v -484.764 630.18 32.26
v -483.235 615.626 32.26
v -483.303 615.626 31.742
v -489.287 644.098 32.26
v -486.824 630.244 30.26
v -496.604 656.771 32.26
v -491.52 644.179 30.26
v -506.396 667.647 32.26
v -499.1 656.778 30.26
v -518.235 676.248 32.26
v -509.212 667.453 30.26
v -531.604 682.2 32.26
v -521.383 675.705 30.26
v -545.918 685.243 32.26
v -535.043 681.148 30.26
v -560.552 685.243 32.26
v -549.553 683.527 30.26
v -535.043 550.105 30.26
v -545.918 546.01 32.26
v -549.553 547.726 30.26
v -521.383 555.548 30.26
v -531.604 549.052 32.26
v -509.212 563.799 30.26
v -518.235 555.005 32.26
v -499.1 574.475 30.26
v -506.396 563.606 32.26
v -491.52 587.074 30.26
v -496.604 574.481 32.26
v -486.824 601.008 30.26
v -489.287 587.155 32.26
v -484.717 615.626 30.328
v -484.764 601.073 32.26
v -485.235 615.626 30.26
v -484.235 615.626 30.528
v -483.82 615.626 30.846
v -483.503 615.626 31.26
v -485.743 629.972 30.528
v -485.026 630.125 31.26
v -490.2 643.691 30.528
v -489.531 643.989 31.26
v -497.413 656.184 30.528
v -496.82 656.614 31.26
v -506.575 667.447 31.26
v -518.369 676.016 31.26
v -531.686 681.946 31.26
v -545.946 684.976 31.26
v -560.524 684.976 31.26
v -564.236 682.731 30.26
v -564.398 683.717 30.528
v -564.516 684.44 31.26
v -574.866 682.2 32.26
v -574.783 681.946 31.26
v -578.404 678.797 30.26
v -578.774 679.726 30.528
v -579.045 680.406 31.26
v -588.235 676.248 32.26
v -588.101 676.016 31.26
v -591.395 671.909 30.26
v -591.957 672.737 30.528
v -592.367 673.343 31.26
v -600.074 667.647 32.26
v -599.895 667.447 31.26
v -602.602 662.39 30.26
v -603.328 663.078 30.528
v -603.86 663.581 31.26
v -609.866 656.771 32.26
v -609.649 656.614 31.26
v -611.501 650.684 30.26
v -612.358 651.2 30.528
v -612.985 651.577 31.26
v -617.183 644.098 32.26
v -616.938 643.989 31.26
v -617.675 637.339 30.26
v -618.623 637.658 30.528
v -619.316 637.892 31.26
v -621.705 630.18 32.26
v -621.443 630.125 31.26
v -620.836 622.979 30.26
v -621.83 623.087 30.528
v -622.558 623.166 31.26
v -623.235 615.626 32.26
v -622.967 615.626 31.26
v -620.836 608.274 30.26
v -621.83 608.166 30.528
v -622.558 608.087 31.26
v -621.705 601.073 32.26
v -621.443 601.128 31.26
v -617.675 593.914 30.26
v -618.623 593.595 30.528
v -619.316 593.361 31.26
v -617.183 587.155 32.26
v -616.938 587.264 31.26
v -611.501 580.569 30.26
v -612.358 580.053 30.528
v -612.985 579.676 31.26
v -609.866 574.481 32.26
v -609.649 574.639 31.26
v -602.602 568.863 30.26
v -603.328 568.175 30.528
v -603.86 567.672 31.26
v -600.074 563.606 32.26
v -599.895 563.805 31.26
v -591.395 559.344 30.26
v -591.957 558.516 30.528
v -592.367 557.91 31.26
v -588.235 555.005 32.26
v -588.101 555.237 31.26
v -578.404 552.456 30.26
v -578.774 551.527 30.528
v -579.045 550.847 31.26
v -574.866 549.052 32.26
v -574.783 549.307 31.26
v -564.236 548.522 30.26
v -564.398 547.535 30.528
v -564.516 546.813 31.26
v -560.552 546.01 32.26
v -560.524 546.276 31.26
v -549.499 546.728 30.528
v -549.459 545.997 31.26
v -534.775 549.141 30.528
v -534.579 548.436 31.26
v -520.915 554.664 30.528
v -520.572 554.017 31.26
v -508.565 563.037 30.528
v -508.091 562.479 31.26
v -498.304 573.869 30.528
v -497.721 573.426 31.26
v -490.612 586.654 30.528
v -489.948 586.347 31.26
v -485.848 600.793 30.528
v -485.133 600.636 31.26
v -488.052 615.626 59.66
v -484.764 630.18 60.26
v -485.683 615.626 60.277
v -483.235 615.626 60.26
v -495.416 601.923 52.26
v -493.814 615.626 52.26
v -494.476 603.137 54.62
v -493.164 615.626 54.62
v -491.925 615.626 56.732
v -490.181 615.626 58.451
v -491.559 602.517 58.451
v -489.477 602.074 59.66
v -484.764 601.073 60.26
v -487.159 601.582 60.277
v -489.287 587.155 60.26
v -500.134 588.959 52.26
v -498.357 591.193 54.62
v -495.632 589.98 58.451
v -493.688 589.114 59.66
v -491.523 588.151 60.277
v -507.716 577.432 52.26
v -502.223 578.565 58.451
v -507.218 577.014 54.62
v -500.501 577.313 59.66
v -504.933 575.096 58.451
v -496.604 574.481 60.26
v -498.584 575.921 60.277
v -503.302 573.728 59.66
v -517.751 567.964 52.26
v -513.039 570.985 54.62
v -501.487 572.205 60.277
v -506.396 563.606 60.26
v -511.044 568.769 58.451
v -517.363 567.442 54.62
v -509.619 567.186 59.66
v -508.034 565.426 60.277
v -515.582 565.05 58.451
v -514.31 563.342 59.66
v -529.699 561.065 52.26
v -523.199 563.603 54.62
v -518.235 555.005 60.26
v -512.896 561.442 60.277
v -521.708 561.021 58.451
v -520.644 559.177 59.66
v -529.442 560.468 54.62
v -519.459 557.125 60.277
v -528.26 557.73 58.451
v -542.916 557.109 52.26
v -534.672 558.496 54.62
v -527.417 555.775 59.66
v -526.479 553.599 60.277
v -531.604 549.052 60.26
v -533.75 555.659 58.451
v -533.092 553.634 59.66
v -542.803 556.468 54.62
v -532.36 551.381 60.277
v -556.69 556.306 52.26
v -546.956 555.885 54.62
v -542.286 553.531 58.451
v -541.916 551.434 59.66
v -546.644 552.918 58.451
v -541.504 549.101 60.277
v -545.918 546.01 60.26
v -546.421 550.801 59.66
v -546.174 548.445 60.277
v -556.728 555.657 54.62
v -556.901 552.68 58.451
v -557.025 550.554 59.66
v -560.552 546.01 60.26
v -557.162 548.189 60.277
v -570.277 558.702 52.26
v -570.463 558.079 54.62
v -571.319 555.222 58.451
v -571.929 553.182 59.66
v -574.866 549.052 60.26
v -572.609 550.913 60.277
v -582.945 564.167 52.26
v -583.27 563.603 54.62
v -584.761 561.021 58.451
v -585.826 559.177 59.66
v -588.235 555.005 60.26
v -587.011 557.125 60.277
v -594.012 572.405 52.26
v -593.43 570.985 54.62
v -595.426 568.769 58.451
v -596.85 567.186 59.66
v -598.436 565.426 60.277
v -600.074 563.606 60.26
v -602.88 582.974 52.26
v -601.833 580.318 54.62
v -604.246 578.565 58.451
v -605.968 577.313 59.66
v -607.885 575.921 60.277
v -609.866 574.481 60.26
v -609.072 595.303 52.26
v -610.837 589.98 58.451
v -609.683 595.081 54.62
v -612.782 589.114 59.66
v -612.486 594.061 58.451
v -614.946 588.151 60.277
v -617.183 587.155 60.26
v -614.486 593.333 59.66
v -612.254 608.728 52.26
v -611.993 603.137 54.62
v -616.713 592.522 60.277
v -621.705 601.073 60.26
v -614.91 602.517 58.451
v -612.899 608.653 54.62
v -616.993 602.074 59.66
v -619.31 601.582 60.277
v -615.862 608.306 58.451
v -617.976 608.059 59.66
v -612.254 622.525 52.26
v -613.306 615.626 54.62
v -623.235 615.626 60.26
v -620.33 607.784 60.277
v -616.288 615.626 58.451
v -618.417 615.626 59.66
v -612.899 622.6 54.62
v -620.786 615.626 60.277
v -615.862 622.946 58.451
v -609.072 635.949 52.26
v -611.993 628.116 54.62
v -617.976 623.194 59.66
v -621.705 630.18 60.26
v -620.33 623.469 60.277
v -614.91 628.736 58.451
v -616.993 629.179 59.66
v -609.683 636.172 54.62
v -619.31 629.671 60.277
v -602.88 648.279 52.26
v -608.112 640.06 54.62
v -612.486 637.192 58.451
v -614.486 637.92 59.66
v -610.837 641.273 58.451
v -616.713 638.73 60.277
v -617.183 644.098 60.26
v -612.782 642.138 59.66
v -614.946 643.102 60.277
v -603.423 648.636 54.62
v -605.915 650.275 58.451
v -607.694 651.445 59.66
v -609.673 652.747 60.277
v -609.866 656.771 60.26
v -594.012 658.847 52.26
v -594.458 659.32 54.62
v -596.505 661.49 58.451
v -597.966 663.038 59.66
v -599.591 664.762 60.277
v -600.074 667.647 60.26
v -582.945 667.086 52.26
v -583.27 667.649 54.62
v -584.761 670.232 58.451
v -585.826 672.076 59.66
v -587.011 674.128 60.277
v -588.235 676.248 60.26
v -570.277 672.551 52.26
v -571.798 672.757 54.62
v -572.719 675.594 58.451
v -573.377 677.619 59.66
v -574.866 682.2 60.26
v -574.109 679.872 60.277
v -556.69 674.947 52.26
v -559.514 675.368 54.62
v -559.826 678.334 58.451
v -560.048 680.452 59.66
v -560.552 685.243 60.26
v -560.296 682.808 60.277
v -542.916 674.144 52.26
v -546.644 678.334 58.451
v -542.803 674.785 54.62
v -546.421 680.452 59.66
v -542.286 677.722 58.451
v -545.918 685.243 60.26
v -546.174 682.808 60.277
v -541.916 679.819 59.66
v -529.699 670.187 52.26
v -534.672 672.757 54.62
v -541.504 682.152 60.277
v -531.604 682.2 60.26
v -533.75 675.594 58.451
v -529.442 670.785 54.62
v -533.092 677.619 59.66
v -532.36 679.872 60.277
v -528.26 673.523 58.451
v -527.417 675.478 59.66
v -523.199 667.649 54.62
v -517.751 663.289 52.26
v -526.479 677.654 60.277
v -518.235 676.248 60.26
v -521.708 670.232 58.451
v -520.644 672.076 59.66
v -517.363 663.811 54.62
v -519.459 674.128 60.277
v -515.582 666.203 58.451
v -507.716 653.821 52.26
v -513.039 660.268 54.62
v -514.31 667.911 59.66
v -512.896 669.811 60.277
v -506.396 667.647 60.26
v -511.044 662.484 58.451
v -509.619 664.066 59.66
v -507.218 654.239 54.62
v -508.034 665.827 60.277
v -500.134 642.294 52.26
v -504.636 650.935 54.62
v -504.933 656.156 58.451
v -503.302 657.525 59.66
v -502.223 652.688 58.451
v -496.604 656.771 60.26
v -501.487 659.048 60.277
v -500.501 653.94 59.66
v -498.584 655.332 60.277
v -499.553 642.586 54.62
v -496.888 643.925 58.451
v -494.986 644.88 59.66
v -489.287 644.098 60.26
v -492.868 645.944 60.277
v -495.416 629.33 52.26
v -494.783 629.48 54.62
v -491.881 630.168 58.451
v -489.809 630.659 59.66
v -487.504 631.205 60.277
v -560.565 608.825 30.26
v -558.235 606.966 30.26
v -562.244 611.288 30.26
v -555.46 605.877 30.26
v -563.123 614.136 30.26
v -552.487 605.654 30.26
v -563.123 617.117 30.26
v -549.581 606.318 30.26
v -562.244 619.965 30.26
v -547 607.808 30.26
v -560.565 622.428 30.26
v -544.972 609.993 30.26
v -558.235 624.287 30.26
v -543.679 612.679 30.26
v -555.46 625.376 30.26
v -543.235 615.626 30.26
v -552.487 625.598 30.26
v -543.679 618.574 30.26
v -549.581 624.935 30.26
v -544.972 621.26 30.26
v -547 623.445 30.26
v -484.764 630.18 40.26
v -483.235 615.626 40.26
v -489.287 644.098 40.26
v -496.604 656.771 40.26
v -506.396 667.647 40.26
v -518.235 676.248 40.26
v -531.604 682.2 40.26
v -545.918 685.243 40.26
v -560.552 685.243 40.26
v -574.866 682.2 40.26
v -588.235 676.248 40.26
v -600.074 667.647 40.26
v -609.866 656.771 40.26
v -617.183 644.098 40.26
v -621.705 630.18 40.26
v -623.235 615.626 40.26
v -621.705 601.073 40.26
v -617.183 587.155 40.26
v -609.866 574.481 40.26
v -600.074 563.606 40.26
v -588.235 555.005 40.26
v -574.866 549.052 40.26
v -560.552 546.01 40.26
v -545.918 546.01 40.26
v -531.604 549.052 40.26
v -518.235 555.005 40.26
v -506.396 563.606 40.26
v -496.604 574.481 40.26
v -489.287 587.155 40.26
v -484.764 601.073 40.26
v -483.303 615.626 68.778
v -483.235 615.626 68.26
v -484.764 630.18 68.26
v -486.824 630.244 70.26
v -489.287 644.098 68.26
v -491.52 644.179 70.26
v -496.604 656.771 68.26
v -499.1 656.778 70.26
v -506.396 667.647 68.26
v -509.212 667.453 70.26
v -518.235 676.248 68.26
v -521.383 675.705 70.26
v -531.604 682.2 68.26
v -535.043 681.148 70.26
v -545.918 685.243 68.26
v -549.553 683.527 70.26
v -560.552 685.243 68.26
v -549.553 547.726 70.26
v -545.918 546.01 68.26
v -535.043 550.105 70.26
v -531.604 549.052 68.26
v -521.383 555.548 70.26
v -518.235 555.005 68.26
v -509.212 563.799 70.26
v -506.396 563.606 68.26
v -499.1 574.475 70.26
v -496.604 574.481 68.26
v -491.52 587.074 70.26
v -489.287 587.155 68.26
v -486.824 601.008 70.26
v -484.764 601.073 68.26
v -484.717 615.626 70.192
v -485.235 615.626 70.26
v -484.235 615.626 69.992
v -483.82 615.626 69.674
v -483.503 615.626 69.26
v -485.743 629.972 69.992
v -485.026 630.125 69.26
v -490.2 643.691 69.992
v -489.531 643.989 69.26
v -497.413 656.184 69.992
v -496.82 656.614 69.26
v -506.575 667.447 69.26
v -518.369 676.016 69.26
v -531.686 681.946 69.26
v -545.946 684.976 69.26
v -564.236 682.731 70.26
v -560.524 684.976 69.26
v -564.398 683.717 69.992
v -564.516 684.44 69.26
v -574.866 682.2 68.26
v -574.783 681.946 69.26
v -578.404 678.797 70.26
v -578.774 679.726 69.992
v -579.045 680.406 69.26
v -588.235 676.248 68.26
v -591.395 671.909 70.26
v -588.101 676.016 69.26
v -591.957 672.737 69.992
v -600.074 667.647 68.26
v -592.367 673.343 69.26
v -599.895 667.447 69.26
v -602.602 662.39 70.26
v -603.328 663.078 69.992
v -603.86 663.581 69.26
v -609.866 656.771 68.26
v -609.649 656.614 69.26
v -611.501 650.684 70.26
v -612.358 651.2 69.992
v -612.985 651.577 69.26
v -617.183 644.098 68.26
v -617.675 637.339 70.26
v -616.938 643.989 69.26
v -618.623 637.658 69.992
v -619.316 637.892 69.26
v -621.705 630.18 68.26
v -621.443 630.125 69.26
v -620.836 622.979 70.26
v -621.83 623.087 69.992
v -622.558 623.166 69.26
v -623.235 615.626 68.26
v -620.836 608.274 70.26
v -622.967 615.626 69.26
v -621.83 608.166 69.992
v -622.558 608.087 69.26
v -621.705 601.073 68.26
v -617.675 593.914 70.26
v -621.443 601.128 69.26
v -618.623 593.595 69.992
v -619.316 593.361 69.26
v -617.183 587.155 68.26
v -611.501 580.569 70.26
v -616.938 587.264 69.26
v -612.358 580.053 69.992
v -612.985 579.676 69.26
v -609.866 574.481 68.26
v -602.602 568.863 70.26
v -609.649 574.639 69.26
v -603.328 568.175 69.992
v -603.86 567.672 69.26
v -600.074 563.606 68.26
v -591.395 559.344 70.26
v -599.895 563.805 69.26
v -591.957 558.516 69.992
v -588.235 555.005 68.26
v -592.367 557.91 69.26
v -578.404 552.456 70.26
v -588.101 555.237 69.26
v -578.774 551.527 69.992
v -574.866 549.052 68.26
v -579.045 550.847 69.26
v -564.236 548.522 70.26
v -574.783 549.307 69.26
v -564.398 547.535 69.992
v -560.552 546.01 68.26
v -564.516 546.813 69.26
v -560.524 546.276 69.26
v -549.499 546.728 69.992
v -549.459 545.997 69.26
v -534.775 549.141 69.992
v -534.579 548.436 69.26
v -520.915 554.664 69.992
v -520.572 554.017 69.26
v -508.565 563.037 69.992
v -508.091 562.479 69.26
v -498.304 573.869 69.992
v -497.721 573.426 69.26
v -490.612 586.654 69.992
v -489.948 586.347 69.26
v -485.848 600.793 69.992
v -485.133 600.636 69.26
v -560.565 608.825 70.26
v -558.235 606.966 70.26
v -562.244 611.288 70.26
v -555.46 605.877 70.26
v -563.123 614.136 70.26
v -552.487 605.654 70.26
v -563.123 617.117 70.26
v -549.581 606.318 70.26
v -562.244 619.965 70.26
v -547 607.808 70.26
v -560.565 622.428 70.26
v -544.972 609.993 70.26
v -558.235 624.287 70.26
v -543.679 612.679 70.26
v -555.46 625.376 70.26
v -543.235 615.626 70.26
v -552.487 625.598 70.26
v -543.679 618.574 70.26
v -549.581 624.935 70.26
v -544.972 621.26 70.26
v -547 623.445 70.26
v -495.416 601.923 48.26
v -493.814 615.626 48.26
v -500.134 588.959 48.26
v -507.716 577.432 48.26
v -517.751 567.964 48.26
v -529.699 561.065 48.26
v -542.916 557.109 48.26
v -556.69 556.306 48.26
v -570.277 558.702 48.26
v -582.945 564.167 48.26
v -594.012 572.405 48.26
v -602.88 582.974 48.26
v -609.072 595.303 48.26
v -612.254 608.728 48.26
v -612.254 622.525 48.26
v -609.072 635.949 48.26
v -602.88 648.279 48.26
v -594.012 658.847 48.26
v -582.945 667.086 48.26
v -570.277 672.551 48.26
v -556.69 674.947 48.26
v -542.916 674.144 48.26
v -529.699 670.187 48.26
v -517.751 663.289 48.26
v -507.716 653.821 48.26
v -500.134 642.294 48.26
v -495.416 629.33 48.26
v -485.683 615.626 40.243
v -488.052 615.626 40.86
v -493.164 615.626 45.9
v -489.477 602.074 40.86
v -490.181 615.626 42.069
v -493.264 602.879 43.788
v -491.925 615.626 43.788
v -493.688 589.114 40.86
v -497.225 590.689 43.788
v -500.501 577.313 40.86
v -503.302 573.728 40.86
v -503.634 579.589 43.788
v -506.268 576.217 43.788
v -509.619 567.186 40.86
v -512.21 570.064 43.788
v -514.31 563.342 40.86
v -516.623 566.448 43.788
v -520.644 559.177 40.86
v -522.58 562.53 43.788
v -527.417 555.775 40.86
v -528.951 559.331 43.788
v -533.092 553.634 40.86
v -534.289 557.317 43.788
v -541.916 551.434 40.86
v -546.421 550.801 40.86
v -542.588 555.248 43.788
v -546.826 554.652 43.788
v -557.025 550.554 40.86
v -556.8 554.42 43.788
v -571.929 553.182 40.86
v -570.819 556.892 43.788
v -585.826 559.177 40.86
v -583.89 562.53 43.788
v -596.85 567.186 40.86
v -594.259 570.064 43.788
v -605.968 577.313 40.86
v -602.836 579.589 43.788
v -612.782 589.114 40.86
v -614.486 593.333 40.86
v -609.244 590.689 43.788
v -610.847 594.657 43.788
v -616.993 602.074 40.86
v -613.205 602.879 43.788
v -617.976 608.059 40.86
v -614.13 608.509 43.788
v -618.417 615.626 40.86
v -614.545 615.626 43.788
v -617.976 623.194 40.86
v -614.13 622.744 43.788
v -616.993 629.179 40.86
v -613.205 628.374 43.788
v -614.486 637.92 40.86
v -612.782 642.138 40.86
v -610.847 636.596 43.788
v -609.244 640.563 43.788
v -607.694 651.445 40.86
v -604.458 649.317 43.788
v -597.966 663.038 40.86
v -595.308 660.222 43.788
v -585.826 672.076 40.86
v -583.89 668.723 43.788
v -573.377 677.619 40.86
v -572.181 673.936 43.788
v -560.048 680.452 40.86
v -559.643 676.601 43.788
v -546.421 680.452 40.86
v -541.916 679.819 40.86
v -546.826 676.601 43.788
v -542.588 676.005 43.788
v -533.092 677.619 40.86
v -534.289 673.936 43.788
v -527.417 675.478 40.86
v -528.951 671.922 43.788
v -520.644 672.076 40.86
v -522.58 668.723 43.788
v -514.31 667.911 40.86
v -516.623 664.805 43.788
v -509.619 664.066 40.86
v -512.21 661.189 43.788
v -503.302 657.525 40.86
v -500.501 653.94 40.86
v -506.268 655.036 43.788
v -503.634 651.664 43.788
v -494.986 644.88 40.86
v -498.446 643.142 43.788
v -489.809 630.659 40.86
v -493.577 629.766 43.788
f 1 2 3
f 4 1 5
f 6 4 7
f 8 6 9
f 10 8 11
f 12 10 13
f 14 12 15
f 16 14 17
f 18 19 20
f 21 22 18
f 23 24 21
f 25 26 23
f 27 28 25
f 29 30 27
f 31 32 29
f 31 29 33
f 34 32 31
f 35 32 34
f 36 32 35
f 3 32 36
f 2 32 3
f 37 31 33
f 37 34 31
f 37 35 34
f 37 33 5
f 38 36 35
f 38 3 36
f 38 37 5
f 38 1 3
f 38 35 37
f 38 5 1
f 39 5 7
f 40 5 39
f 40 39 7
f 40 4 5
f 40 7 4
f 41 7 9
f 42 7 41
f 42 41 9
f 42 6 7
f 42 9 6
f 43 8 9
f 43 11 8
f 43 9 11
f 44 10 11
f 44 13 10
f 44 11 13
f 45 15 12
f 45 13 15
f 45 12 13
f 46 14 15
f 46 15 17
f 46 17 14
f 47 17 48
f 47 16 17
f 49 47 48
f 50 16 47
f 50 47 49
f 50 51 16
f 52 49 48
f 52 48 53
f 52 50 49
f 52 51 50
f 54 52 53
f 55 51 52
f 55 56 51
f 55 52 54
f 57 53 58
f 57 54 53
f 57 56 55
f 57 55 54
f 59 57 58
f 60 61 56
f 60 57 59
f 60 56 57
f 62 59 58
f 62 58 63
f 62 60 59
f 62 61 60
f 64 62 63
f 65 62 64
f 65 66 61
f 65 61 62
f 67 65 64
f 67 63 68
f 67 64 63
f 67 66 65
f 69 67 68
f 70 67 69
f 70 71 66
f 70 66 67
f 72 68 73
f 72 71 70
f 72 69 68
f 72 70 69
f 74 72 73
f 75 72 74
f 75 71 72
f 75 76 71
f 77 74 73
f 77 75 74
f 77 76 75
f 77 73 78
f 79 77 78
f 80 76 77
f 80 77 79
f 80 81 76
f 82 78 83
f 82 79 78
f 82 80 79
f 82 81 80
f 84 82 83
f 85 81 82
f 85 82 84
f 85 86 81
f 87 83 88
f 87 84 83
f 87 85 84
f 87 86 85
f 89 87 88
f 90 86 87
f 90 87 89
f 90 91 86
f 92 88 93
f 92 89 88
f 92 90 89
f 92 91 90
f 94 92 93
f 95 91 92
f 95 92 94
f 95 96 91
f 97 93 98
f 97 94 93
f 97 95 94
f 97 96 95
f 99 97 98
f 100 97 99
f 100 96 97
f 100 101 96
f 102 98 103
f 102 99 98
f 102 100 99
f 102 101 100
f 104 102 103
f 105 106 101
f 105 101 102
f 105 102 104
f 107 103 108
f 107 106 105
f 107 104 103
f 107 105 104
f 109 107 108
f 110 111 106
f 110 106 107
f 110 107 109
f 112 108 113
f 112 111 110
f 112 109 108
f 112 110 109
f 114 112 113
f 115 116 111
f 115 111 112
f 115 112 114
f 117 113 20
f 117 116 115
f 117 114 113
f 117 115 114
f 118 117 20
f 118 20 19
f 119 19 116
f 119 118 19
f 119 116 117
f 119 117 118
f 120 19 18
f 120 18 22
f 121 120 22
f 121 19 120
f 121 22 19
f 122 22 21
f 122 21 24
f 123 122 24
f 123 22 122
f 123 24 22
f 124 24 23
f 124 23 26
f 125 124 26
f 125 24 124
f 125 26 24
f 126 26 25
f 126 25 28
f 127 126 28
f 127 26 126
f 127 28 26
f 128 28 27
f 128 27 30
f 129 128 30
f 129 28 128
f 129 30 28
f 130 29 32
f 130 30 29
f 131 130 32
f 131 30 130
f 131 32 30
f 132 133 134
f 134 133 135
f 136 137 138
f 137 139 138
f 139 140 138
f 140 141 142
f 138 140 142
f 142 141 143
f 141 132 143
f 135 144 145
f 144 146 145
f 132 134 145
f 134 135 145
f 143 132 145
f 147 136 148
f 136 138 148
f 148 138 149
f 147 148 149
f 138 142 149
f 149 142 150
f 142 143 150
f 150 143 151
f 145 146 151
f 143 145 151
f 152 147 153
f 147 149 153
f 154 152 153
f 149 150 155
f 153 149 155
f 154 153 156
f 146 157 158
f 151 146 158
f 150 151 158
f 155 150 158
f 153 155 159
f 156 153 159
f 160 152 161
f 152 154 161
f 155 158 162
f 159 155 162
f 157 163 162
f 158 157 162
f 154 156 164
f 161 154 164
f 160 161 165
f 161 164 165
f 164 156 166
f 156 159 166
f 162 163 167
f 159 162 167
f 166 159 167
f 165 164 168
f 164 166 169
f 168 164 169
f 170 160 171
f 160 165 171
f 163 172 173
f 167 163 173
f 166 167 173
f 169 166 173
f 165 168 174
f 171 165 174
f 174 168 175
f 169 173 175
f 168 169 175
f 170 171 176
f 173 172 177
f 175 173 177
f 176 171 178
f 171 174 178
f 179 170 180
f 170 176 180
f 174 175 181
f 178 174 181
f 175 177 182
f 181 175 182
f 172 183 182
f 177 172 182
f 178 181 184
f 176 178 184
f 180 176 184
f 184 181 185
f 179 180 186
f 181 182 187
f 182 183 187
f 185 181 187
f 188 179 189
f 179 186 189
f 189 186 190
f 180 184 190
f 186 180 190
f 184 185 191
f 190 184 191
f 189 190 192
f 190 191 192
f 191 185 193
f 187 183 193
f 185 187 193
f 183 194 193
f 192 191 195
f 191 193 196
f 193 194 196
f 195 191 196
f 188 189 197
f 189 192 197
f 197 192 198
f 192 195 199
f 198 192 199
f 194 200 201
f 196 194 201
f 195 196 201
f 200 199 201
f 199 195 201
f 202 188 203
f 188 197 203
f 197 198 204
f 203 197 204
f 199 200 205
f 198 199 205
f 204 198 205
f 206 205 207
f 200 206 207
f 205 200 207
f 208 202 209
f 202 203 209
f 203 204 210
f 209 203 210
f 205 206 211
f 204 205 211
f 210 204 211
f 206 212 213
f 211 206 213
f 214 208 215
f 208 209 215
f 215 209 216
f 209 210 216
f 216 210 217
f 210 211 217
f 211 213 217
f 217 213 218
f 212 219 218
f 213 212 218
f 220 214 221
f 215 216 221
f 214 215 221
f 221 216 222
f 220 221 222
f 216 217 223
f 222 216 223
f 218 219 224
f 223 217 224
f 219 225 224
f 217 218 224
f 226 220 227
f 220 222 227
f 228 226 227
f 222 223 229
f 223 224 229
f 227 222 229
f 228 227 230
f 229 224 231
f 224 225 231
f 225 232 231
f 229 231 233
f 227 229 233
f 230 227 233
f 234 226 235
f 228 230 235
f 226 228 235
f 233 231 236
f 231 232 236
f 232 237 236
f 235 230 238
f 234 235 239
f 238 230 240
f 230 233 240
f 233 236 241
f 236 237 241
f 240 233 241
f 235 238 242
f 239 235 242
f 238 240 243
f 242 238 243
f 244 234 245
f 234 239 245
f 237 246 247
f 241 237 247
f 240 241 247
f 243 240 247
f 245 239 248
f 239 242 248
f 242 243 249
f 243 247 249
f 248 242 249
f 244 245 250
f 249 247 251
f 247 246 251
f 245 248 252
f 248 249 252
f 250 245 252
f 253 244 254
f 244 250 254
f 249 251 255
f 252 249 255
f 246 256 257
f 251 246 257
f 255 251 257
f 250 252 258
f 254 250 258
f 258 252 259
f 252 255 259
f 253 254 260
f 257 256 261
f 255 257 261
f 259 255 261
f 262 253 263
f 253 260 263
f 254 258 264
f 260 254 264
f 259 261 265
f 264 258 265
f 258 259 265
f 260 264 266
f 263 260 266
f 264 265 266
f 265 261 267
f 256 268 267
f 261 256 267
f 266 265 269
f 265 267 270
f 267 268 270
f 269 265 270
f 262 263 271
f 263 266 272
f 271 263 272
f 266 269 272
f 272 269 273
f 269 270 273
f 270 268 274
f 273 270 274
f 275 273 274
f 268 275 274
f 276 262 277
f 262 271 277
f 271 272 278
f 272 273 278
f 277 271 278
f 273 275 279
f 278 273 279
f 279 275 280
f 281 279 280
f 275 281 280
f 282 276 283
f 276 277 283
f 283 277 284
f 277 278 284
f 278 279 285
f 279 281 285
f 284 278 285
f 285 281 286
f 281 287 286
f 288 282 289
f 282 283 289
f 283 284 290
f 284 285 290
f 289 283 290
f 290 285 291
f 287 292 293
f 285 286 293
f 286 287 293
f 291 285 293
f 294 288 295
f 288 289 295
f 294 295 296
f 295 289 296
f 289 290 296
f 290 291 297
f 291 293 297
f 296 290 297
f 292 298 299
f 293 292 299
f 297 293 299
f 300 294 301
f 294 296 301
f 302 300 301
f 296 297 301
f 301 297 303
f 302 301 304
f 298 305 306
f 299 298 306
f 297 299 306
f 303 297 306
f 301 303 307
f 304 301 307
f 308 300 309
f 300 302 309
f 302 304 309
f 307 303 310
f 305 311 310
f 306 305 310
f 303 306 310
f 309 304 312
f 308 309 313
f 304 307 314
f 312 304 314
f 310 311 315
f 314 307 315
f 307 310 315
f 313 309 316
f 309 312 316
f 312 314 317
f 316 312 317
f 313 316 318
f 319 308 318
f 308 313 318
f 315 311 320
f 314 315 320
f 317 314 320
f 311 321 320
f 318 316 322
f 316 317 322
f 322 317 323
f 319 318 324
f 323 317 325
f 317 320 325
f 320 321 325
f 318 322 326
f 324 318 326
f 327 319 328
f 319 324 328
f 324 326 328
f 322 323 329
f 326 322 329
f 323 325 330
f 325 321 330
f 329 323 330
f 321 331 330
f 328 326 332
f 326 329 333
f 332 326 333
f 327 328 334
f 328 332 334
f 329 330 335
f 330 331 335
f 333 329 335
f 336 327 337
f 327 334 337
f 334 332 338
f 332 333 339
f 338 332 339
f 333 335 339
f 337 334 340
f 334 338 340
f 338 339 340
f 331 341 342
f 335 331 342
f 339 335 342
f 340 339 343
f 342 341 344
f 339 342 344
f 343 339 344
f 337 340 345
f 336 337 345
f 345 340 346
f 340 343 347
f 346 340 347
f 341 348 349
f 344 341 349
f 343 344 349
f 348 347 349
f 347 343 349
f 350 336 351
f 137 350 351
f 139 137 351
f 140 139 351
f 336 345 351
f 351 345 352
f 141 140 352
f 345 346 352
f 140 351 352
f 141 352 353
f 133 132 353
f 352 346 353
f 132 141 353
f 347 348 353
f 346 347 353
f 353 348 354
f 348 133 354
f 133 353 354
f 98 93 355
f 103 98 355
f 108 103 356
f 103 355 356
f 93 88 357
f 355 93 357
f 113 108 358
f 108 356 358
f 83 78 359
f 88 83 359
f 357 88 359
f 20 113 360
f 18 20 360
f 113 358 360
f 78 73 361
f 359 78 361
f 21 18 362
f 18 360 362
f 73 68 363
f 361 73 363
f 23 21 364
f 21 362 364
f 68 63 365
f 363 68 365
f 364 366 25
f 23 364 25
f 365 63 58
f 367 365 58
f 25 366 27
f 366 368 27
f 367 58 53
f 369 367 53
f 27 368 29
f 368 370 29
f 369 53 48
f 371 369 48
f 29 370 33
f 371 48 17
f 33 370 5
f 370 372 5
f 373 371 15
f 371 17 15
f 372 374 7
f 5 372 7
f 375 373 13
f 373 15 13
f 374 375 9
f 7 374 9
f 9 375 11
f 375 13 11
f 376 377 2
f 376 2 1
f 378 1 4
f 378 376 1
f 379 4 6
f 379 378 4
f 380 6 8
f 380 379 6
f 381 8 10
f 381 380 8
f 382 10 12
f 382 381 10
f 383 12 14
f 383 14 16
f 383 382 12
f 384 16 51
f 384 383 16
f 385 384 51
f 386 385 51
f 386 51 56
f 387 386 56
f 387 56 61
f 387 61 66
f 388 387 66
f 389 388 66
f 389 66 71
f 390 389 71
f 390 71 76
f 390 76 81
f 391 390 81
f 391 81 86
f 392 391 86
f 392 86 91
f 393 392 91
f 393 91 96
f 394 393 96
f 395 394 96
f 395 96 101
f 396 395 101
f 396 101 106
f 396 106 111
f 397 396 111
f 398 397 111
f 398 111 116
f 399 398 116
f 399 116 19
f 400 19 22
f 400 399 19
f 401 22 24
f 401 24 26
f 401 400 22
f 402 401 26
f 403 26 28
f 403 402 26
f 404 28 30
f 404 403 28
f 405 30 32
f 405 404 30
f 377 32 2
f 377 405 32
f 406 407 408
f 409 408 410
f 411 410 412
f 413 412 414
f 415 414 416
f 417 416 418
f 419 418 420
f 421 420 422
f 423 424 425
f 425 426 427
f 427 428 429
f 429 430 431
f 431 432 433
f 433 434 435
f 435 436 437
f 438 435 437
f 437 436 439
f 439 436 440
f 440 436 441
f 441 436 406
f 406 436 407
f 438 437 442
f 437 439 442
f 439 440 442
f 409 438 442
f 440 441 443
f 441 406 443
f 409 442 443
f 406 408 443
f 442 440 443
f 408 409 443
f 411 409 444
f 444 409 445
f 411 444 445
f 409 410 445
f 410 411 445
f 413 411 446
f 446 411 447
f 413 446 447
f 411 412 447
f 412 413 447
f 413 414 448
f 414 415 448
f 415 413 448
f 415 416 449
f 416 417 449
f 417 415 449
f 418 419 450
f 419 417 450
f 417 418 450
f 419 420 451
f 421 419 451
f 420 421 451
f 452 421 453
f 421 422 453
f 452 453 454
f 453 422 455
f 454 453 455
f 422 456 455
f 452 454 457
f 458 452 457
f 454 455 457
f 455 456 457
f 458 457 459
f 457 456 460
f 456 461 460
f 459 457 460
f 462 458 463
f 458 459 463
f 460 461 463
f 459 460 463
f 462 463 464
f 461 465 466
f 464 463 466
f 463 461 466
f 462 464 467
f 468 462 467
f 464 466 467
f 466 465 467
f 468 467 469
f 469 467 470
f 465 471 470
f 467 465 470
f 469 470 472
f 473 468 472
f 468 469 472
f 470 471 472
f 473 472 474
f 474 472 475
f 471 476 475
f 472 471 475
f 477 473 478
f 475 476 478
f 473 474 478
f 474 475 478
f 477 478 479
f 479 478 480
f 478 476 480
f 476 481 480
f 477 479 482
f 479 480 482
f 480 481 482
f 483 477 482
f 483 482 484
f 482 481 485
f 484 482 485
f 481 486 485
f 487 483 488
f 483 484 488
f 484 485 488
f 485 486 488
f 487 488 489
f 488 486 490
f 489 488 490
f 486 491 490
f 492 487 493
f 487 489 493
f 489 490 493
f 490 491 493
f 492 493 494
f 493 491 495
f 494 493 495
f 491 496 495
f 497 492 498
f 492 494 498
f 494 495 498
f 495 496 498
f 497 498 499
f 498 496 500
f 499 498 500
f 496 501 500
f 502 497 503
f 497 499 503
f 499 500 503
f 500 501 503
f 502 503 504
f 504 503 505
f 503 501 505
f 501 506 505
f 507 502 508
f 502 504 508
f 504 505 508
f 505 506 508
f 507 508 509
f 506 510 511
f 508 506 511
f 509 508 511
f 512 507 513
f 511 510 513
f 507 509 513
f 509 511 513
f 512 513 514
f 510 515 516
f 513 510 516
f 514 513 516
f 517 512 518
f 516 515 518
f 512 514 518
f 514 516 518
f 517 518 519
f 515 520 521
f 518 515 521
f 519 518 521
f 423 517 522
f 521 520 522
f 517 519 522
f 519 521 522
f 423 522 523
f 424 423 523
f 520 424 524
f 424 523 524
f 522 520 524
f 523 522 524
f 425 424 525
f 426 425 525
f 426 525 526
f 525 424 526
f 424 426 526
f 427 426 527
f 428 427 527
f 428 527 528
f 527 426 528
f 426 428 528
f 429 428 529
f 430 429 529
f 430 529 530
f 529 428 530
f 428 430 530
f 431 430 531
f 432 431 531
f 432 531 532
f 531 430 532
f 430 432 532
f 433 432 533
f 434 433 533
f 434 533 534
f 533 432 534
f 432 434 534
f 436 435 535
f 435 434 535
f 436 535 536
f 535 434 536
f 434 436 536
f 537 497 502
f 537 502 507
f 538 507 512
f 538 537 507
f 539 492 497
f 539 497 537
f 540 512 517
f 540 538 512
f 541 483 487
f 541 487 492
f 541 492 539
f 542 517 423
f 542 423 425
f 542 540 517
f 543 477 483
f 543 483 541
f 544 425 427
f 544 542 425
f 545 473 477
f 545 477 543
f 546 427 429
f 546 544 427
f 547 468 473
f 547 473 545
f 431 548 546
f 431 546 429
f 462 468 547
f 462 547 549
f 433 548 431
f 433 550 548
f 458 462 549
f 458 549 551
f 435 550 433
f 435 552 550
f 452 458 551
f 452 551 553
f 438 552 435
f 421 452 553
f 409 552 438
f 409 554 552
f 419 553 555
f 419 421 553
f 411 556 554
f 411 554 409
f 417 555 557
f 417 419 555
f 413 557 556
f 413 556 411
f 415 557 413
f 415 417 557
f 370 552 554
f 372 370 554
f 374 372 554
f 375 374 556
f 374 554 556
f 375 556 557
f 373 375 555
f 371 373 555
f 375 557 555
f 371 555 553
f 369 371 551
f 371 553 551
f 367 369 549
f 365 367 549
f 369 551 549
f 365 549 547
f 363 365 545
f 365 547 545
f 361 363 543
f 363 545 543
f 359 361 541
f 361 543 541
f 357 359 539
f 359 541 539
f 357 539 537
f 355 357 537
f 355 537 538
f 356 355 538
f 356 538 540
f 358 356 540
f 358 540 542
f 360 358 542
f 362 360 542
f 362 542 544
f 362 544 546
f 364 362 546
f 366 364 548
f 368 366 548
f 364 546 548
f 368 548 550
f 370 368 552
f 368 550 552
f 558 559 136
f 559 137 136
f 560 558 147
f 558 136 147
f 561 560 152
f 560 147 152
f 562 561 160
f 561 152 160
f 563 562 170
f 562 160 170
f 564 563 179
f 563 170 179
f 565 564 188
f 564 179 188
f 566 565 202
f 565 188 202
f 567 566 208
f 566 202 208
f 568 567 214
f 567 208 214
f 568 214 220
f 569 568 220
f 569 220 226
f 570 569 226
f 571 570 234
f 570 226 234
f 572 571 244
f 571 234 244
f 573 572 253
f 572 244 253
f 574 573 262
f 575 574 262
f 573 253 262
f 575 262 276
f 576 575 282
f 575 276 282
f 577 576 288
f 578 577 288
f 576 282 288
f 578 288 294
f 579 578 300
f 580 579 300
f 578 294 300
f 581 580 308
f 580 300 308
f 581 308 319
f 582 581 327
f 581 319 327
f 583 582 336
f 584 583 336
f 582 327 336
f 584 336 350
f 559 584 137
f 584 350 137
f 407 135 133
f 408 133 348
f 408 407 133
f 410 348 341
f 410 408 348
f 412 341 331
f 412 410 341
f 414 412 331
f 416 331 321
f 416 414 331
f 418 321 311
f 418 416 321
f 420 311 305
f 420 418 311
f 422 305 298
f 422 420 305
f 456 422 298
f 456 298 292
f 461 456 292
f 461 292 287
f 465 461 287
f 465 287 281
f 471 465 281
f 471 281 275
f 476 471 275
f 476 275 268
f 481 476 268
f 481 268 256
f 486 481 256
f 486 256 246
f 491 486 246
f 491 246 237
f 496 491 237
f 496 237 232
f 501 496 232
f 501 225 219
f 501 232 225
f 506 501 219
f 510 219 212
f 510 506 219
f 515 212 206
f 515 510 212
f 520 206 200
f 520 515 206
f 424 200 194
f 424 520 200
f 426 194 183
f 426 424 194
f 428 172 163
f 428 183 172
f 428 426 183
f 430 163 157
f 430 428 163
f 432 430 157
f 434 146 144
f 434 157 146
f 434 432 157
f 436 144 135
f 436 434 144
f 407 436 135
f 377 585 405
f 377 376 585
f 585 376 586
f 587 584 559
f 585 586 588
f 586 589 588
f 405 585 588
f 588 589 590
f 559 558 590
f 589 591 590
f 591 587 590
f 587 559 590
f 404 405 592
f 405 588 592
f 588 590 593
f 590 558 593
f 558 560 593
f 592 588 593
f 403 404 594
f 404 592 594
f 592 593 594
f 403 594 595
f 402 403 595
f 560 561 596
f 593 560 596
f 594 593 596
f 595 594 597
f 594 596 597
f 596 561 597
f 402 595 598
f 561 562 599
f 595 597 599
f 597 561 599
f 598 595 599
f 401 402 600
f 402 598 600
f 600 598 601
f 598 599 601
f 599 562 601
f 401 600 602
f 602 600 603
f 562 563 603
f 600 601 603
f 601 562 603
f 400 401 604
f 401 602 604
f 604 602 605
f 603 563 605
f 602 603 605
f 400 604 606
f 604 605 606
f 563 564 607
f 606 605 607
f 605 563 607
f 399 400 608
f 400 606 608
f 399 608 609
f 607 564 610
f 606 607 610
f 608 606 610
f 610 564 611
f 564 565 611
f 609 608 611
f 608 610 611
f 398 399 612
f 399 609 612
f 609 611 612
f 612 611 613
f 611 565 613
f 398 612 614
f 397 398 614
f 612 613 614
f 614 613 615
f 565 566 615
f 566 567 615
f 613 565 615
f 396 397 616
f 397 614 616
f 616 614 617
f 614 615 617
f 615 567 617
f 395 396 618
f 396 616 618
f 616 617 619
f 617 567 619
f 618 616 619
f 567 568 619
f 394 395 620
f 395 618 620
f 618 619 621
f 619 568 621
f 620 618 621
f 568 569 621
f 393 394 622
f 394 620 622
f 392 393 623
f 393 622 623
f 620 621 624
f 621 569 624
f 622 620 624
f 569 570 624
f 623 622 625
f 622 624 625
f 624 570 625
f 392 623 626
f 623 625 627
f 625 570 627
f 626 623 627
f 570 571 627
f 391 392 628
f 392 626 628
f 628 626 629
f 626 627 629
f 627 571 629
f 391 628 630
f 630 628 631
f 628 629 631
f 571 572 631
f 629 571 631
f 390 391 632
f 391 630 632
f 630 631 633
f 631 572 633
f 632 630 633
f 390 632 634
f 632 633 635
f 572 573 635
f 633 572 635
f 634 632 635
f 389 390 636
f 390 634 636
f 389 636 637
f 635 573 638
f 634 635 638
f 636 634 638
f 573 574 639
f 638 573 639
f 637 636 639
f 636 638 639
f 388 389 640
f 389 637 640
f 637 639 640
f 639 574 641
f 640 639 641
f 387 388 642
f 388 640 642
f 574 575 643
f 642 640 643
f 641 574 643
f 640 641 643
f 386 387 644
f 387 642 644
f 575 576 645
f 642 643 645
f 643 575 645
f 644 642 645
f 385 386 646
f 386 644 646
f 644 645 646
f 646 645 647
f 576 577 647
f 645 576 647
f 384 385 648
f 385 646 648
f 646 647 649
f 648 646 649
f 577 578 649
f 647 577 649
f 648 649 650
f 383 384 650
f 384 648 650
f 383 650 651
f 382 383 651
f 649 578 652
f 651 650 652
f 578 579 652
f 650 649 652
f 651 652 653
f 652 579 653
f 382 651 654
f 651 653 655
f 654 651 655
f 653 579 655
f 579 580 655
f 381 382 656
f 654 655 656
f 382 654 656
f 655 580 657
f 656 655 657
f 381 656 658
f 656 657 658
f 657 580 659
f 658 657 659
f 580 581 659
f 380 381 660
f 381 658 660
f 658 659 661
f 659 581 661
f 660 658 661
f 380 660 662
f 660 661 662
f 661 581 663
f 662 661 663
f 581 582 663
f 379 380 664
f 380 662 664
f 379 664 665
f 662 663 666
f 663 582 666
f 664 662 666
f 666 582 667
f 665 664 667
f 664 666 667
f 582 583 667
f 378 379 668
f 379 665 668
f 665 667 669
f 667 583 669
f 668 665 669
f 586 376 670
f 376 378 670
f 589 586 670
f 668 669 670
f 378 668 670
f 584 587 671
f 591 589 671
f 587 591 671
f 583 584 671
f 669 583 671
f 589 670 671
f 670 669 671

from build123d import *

# Parameters (mm, degrees)
SKETCH_1_R      = 70
SKETCH_1_R_2    = 14.438127561
EXTRUDE_1_DEPTH = 40
SKETCH_2_R      = 14.438127561
SKETCH_2_R_2    = 10
EXTRUDE_2_DEPTH = 40
FILLET_1_R      = 2


with BuildPart() as part:
    # 草图1 → 凸台-拉伸1 (new body)
    with BuildSketch(Plane.XY.offset(70.26)):
        with Locations((-553.234692624, 615.626439551)):
            Circle(SKETCH_1_R)
        with Locations((-553.234692624, 615.626439551)):
            Circle(SKETCH_1_R_2, mode=Mode.SUBTRACT)
    extrude(amount=-EXTRUDE_1_DEPTH)

    # 草图2 → 凸台-拉伸2 (add)
    with BuildSketch(Plane.XY.offset(70.26)):
        with Locations((-553.234692624, 615.626439551)):
            Circle(SKETCH_2_R)
        with Locations((-553.234692624, 615.626439551)):
            Circle(SKETCH_2_R_2, mode=Mode.SUBTRACT)
    extrude(amount=-EXTRUDE_2_DEPTH)

    # 草图4 → 切除-旋转1 (revolve, cut)
    with BuildSketch(Plane(origin=(0, 615.626439551, 0), x_dir=(1, 0, 0), z_dir=(0, 1, 0))):
        with BuildLine():
            Line((-493.814063129, -48.26), (-493.814063129, -52.26))
            ThreePointArc((-493.814063129, -52.26), (-490.181232126, -58.451059372), (-483.234692624, -60.26))
            Line((-483.234692624, -60.26), (-483.234692624, -40.26))
            ThreePointArc((-483.234692624, -40.26), (-490.181232126, -42.068940628), (-493.814063129, -48.26))
        make_face()
    revolve(axis=Axis((-553.234692624, 615.626439551, 70.26), (0, 0, -1)), mode=Mode.SUBTRACT)

    # 圆角1
    fillet_1_edges = [part.edges().sort_by_distance(p)[0] for p in [
        (-623.234692624, 615.626439551, 70.26),
        (-623.234692624, 615.626439551, 30.26),
    ]]
    fillet(fillet_1_edges, radius=FILLET_1_R)


solid = part.part
